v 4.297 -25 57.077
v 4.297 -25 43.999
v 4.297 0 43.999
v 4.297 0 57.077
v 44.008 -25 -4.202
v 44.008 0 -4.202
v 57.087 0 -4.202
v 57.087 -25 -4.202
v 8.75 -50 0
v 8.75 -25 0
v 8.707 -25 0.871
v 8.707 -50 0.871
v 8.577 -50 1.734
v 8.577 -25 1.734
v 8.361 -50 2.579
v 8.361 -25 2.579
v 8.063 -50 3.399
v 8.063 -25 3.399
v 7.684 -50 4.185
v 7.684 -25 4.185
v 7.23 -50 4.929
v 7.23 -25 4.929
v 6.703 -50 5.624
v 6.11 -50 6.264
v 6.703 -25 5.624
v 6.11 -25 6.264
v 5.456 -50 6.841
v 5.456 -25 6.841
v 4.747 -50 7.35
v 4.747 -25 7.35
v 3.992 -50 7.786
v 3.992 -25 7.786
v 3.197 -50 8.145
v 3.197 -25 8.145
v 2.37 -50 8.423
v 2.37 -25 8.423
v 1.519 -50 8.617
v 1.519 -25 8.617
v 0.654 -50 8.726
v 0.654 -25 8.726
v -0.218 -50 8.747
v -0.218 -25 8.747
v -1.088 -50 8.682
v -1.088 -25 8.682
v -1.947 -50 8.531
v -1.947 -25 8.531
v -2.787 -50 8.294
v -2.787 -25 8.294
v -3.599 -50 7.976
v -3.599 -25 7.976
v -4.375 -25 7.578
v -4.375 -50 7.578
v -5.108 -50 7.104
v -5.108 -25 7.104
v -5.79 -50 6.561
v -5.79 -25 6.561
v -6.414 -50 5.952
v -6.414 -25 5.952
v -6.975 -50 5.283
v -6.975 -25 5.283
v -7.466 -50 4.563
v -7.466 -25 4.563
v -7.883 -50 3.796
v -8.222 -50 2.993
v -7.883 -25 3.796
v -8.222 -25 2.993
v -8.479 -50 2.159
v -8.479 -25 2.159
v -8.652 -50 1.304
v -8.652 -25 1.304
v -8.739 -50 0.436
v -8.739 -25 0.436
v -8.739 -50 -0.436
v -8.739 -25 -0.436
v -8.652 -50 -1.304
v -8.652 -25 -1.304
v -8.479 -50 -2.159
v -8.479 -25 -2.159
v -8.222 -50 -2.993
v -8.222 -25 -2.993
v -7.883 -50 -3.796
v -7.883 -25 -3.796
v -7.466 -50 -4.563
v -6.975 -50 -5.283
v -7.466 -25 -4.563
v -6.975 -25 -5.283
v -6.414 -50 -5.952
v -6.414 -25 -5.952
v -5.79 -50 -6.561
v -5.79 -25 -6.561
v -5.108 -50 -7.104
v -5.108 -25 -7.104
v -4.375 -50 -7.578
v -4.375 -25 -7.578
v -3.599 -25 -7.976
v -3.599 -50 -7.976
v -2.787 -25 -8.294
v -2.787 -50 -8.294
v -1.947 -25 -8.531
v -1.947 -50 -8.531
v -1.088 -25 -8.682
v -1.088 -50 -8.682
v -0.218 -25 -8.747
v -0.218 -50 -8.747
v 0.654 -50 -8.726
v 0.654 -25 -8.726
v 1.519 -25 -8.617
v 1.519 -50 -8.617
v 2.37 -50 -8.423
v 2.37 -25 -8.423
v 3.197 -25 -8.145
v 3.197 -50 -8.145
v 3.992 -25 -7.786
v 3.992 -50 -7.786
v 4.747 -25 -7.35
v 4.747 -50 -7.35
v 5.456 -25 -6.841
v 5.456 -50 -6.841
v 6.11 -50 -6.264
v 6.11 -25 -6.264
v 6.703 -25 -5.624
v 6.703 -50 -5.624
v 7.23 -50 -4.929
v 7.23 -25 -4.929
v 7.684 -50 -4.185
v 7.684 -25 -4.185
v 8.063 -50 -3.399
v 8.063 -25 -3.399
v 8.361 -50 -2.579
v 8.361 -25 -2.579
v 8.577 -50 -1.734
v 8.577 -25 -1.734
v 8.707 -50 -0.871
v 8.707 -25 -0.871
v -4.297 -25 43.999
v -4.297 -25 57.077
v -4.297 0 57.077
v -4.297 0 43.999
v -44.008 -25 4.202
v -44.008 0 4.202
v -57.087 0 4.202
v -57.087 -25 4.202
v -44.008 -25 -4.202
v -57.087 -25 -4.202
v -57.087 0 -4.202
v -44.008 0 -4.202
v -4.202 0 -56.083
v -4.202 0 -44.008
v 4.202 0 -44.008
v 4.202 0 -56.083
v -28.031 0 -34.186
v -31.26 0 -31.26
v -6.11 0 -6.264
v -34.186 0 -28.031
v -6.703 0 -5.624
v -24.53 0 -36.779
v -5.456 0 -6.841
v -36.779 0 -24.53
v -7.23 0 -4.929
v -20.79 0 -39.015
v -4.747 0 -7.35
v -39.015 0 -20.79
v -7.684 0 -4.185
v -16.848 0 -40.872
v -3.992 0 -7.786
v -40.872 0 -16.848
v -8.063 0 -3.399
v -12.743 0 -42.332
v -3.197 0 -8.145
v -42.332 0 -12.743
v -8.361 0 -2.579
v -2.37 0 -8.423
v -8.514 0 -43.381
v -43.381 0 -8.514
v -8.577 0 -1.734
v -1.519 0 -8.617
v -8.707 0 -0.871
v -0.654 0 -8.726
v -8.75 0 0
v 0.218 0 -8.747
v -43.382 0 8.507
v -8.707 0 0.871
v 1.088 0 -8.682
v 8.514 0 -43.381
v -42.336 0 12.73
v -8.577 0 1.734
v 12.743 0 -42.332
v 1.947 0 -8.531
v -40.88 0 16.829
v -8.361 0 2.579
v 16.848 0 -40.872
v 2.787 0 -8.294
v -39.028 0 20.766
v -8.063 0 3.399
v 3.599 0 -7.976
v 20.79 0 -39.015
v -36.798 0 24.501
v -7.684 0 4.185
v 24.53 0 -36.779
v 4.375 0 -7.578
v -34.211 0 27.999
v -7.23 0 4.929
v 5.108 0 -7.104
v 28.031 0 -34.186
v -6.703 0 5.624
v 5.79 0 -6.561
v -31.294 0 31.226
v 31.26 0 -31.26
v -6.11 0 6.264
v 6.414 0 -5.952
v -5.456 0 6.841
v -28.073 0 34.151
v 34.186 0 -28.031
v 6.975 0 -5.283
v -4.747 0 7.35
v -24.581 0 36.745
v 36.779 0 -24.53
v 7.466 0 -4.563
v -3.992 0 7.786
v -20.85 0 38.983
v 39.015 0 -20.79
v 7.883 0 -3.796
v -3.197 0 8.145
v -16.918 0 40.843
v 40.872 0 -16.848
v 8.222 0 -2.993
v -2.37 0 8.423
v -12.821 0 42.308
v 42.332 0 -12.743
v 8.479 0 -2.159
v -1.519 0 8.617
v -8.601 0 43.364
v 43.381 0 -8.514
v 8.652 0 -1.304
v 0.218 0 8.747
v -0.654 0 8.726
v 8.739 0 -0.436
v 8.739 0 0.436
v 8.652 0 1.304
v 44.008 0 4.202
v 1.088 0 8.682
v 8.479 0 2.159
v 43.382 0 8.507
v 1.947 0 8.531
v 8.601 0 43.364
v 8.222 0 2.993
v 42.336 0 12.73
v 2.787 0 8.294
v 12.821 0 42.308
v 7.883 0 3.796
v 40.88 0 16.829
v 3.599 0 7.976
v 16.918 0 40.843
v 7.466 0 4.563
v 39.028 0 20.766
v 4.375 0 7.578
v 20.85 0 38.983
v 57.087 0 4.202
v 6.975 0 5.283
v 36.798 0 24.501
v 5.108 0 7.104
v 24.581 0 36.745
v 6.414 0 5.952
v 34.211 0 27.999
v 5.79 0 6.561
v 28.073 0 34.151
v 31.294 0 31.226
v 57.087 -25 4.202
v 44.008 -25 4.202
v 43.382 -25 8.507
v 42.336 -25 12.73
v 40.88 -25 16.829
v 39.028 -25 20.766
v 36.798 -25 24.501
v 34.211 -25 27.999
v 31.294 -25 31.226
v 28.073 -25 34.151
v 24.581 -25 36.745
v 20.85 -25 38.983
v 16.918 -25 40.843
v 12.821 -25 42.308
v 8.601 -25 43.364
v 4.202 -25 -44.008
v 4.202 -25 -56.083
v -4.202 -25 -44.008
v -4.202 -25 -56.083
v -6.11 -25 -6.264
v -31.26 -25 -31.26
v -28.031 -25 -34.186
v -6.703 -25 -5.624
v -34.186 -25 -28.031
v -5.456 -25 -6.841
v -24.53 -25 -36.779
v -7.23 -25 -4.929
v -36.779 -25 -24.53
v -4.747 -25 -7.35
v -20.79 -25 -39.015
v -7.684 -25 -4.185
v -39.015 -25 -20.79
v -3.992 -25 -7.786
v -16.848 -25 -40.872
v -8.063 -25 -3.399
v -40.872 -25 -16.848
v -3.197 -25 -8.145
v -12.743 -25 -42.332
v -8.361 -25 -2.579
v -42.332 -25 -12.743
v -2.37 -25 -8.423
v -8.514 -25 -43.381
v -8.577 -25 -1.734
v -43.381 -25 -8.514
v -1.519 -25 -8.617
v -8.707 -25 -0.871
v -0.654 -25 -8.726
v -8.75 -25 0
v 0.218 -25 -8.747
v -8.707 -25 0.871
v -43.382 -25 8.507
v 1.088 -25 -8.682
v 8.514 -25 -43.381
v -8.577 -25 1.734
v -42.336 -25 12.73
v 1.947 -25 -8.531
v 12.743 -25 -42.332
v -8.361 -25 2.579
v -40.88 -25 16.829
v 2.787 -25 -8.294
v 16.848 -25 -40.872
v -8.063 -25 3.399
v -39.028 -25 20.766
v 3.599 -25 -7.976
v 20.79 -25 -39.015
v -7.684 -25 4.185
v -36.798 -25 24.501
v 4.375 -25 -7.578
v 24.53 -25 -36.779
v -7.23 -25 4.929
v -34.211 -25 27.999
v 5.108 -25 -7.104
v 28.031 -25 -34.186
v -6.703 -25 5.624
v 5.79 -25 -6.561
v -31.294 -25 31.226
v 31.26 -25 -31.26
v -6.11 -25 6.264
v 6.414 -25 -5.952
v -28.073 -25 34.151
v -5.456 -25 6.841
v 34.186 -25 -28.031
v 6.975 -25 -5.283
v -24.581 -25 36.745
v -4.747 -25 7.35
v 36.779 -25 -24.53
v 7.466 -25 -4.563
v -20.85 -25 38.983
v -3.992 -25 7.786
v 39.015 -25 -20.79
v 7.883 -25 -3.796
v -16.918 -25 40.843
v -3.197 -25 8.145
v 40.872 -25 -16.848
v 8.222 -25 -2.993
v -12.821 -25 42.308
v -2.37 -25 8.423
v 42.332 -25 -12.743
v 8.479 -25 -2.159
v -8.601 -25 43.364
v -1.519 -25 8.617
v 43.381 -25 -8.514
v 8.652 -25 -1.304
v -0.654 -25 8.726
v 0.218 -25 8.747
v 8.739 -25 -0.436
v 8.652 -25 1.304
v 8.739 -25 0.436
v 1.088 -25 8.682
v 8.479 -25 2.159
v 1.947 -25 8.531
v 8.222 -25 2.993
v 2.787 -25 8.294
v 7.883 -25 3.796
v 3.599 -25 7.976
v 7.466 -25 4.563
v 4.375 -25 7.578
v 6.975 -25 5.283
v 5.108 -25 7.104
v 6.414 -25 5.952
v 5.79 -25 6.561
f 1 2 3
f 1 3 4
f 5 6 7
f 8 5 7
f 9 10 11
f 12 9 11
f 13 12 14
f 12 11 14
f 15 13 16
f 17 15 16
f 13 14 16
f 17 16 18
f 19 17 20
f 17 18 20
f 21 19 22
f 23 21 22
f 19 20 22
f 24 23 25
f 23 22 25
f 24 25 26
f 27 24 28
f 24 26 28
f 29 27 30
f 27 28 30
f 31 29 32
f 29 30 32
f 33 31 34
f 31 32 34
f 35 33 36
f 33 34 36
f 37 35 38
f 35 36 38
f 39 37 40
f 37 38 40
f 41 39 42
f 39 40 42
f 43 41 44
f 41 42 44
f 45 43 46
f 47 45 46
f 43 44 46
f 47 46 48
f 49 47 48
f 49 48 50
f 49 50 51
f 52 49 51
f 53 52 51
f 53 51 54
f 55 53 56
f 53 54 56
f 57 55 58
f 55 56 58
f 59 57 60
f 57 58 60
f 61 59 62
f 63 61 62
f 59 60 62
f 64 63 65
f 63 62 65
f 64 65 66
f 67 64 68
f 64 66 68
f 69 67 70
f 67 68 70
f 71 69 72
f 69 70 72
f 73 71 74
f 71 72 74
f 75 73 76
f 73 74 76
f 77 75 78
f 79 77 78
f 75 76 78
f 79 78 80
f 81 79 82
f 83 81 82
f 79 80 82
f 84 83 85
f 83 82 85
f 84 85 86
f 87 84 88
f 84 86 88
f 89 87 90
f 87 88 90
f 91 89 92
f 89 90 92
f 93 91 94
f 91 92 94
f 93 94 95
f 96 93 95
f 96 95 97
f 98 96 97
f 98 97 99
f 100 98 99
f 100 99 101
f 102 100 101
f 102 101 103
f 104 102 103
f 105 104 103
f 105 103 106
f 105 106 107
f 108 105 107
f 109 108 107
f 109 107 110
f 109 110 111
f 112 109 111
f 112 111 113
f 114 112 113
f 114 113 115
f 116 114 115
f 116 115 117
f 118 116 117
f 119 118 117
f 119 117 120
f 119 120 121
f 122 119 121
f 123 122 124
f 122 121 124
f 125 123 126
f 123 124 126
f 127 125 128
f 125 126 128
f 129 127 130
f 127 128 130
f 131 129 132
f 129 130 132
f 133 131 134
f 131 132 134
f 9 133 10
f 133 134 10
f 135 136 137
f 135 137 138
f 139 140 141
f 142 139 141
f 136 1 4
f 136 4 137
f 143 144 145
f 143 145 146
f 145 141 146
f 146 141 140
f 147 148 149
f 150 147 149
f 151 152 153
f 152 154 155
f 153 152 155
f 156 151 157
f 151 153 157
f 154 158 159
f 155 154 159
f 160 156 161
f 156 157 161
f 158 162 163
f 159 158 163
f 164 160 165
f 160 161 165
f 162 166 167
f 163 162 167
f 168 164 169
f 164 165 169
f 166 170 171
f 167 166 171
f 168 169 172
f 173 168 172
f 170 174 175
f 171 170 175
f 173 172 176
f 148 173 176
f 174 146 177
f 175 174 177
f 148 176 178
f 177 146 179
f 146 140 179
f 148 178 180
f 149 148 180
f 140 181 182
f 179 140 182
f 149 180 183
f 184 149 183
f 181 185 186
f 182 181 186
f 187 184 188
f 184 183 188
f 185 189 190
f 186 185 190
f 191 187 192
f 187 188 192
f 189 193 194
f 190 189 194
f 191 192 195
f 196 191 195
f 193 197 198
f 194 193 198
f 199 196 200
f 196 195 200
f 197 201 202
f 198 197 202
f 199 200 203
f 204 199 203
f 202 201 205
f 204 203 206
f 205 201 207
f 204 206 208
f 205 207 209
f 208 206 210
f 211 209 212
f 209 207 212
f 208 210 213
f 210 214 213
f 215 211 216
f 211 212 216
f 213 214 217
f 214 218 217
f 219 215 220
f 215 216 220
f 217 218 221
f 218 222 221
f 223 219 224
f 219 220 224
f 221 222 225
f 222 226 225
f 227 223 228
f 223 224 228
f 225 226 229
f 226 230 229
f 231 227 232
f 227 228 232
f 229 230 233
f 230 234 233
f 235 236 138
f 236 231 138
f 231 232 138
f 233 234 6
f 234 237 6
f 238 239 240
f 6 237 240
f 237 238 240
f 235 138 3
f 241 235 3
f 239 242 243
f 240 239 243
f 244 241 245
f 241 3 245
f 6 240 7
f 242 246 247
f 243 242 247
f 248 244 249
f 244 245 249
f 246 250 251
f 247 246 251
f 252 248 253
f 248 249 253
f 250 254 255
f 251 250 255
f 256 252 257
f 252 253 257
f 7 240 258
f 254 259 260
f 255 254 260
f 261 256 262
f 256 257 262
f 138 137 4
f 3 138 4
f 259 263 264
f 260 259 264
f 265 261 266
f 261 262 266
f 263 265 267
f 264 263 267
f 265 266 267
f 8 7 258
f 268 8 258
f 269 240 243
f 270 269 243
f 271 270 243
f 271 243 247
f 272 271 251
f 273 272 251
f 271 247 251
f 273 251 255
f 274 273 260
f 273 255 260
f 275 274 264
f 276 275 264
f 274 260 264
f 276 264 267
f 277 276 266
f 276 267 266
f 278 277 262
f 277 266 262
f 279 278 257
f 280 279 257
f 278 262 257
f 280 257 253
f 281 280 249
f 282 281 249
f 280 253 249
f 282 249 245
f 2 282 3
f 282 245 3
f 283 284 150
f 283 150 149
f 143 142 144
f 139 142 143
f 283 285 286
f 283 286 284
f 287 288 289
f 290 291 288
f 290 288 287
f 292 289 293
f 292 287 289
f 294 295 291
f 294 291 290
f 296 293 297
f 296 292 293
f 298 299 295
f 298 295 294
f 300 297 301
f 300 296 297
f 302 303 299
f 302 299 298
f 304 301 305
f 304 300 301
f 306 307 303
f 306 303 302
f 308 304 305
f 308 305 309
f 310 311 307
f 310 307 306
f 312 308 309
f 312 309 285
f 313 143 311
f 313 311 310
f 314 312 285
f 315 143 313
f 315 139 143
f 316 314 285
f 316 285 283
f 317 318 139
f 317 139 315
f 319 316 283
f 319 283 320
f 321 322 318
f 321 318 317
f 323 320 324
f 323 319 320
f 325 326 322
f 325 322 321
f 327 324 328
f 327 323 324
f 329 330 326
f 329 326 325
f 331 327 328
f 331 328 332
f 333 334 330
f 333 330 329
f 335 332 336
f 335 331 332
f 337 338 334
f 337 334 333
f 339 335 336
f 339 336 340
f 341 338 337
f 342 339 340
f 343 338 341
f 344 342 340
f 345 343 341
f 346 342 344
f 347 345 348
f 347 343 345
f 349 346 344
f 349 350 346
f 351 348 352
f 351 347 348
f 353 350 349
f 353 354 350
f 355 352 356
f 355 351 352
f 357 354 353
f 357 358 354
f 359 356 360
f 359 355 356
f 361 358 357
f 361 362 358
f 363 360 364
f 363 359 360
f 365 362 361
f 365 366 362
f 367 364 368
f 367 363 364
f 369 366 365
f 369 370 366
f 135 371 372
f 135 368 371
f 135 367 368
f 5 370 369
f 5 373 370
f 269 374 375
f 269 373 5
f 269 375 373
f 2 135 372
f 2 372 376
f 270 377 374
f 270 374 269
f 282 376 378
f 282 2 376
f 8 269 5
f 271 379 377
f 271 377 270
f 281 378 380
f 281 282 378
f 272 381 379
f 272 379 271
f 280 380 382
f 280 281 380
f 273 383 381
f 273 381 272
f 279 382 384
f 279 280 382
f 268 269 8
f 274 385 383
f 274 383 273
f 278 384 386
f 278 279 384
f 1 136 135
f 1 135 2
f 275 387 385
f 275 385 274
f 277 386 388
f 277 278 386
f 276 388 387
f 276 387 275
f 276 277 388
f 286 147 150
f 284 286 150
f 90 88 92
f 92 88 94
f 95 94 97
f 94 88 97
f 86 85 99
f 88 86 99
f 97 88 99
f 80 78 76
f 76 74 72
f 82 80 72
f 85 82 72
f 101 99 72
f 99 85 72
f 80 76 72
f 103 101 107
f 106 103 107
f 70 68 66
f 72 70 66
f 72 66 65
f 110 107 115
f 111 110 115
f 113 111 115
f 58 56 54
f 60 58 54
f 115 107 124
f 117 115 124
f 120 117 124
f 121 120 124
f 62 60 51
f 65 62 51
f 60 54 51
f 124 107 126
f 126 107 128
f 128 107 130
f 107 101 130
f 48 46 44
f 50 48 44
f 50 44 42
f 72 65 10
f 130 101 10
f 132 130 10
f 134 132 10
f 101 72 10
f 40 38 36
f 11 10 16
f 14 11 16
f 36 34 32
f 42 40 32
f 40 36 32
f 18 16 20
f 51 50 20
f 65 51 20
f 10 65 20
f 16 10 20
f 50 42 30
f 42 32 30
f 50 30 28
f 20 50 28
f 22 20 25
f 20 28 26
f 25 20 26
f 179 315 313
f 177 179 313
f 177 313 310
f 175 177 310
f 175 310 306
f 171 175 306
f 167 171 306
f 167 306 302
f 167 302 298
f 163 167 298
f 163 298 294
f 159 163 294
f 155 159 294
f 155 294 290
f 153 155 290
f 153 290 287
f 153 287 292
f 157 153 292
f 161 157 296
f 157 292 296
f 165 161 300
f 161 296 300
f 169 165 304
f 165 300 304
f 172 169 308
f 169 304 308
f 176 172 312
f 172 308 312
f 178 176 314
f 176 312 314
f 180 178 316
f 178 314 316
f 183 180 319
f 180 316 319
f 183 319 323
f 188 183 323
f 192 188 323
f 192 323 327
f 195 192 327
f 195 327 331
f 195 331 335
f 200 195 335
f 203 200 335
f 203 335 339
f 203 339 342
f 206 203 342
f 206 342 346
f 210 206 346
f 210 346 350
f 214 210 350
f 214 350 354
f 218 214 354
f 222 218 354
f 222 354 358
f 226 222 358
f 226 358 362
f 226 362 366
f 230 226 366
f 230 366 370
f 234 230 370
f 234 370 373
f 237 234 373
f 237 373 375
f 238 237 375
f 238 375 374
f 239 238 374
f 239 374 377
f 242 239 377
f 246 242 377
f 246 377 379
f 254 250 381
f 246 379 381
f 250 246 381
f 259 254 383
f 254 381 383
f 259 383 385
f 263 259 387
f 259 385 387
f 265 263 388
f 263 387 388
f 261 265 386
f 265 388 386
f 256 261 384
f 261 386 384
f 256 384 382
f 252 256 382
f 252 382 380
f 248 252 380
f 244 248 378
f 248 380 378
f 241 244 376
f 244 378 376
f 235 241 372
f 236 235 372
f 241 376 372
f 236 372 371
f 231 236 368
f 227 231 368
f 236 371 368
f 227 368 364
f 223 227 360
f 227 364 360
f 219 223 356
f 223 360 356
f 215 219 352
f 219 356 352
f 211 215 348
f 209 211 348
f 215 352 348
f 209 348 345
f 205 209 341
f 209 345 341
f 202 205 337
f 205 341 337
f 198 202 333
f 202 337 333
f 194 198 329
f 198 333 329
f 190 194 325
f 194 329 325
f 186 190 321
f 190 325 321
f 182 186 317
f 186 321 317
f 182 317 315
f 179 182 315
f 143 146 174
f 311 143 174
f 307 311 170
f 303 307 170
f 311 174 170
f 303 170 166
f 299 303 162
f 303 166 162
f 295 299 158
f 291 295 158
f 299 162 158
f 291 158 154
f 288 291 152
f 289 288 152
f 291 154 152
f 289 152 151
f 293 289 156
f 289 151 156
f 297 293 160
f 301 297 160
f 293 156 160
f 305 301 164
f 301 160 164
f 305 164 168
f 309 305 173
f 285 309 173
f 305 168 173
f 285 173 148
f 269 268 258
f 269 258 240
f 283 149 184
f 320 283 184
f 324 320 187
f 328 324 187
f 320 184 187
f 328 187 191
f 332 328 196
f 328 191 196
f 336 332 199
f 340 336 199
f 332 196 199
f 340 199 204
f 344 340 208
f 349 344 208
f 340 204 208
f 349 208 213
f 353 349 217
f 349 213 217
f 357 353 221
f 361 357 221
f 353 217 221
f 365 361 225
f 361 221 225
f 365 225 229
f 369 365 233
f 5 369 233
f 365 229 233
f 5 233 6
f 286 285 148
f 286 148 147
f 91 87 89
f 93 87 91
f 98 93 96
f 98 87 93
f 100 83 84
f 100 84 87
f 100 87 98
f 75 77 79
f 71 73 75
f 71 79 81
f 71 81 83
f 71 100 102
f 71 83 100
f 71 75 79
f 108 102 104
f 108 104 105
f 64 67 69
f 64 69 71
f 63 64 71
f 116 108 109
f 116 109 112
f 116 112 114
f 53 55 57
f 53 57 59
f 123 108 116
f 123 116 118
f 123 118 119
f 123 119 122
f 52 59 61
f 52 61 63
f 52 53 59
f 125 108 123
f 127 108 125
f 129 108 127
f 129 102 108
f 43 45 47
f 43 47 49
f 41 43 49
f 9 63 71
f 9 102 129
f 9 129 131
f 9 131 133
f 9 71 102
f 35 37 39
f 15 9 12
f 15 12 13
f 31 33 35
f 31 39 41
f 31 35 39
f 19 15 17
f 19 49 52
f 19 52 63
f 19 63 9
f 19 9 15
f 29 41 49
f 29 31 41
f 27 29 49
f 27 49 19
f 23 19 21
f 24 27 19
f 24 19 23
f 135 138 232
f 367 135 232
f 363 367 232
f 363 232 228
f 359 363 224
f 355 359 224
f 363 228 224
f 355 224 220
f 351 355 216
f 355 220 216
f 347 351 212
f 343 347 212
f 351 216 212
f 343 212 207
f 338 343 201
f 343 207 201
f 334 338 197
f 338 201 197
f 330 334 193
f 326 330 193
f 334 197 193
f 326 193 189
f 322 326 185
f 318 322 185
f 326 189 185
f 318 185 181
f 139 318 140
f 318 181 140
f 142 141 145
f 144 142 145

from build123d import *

# Parameters (mm, degrees)
F1_DEPTH = 25
F2_D     = 17.5
F3_R     = 8.75
F4_DEPTH = 25


with BuildPart() as f1:
    # F0 (on Front) → F1 (new body)
    with BuildSketch(Plane.XZ):
        with BuildLine():
            Line((4.2971530929, 43.9991094172), (4.2971530929, 57.0774041116))
            Line((4.2971530929, 57.0774041116), (-4.2971530929, 57.0774041116))
            Line((-4.2971530929, 57.0774041116), (-4.2971530929, 43.9991094172))
            ThreePointArc((-4.2971530929, 43.9991094172), (-31.2937936408, 31.2263611998), (-44.0082766083, 4.2022308573))
            Line((-44.0082766083, 4.2022308573), (-57.0865713027, 4.2022308573))
            Line((-57.0865713027, 4.2022308573), (-57.0865713027, -4.2022308573))
            Line((-57.0865713027, -4.2022308573), (-44.0082766083, -4.2022308573))
            ThreePointArc((-44.0082766083, -4.2022308573), (-31.2600956029, -31.2600956029), (-4.2022308573, -44.0082766083))
            Line((-4.2022308573, -44.0082766083), (-4.2022308573, -56.0833216488))
            Line((-4.2022308573, -56.0833216488), (4.2022308573, -56.0833216488))
            Line((4.2022308573, -56.0833216488), (4.2022308573, -44.0082766083))
            ThreePointArc((4.2022308573, -44.0082766083), (31.2600956029, -31.2600956029), (44.0082766083, -4.2022308573))
            Line((44.0082766083, -4.2022308573), (57.0865713027, -4.2022308573))
            Line((57.0865713027, -4.2022308573), (57.0865713027, 4.2022308573))
            Line((57.0865713027, 4.2022308573), (44.0082766083, 4.2022308573))
            ThreePointArc((44.0082766083, 4.2022308573), (31.2937936408, 31.2263611998), (4.2971530929, 43.9991094172))
        make_face()
    extrude(amount=F1_DEPTH)

    # F2 (through all)
    with Locations(Plane(origin=(0, 0, 0), x_dir=(1, 0, 0), z_dir=(0, 1, 0))):
        with Locations((0, 0)):
            Hole(F2_D / 2)


with BuildPart() as f4:
    # F3 (on face) → F4 (new body)
    with BuildSketch(Plane.XZ.offset(25)):
        Circle(F3_R)
    extrude(amount=F4_DEPTH)


solid = Compound([f1.part, f4.part])
